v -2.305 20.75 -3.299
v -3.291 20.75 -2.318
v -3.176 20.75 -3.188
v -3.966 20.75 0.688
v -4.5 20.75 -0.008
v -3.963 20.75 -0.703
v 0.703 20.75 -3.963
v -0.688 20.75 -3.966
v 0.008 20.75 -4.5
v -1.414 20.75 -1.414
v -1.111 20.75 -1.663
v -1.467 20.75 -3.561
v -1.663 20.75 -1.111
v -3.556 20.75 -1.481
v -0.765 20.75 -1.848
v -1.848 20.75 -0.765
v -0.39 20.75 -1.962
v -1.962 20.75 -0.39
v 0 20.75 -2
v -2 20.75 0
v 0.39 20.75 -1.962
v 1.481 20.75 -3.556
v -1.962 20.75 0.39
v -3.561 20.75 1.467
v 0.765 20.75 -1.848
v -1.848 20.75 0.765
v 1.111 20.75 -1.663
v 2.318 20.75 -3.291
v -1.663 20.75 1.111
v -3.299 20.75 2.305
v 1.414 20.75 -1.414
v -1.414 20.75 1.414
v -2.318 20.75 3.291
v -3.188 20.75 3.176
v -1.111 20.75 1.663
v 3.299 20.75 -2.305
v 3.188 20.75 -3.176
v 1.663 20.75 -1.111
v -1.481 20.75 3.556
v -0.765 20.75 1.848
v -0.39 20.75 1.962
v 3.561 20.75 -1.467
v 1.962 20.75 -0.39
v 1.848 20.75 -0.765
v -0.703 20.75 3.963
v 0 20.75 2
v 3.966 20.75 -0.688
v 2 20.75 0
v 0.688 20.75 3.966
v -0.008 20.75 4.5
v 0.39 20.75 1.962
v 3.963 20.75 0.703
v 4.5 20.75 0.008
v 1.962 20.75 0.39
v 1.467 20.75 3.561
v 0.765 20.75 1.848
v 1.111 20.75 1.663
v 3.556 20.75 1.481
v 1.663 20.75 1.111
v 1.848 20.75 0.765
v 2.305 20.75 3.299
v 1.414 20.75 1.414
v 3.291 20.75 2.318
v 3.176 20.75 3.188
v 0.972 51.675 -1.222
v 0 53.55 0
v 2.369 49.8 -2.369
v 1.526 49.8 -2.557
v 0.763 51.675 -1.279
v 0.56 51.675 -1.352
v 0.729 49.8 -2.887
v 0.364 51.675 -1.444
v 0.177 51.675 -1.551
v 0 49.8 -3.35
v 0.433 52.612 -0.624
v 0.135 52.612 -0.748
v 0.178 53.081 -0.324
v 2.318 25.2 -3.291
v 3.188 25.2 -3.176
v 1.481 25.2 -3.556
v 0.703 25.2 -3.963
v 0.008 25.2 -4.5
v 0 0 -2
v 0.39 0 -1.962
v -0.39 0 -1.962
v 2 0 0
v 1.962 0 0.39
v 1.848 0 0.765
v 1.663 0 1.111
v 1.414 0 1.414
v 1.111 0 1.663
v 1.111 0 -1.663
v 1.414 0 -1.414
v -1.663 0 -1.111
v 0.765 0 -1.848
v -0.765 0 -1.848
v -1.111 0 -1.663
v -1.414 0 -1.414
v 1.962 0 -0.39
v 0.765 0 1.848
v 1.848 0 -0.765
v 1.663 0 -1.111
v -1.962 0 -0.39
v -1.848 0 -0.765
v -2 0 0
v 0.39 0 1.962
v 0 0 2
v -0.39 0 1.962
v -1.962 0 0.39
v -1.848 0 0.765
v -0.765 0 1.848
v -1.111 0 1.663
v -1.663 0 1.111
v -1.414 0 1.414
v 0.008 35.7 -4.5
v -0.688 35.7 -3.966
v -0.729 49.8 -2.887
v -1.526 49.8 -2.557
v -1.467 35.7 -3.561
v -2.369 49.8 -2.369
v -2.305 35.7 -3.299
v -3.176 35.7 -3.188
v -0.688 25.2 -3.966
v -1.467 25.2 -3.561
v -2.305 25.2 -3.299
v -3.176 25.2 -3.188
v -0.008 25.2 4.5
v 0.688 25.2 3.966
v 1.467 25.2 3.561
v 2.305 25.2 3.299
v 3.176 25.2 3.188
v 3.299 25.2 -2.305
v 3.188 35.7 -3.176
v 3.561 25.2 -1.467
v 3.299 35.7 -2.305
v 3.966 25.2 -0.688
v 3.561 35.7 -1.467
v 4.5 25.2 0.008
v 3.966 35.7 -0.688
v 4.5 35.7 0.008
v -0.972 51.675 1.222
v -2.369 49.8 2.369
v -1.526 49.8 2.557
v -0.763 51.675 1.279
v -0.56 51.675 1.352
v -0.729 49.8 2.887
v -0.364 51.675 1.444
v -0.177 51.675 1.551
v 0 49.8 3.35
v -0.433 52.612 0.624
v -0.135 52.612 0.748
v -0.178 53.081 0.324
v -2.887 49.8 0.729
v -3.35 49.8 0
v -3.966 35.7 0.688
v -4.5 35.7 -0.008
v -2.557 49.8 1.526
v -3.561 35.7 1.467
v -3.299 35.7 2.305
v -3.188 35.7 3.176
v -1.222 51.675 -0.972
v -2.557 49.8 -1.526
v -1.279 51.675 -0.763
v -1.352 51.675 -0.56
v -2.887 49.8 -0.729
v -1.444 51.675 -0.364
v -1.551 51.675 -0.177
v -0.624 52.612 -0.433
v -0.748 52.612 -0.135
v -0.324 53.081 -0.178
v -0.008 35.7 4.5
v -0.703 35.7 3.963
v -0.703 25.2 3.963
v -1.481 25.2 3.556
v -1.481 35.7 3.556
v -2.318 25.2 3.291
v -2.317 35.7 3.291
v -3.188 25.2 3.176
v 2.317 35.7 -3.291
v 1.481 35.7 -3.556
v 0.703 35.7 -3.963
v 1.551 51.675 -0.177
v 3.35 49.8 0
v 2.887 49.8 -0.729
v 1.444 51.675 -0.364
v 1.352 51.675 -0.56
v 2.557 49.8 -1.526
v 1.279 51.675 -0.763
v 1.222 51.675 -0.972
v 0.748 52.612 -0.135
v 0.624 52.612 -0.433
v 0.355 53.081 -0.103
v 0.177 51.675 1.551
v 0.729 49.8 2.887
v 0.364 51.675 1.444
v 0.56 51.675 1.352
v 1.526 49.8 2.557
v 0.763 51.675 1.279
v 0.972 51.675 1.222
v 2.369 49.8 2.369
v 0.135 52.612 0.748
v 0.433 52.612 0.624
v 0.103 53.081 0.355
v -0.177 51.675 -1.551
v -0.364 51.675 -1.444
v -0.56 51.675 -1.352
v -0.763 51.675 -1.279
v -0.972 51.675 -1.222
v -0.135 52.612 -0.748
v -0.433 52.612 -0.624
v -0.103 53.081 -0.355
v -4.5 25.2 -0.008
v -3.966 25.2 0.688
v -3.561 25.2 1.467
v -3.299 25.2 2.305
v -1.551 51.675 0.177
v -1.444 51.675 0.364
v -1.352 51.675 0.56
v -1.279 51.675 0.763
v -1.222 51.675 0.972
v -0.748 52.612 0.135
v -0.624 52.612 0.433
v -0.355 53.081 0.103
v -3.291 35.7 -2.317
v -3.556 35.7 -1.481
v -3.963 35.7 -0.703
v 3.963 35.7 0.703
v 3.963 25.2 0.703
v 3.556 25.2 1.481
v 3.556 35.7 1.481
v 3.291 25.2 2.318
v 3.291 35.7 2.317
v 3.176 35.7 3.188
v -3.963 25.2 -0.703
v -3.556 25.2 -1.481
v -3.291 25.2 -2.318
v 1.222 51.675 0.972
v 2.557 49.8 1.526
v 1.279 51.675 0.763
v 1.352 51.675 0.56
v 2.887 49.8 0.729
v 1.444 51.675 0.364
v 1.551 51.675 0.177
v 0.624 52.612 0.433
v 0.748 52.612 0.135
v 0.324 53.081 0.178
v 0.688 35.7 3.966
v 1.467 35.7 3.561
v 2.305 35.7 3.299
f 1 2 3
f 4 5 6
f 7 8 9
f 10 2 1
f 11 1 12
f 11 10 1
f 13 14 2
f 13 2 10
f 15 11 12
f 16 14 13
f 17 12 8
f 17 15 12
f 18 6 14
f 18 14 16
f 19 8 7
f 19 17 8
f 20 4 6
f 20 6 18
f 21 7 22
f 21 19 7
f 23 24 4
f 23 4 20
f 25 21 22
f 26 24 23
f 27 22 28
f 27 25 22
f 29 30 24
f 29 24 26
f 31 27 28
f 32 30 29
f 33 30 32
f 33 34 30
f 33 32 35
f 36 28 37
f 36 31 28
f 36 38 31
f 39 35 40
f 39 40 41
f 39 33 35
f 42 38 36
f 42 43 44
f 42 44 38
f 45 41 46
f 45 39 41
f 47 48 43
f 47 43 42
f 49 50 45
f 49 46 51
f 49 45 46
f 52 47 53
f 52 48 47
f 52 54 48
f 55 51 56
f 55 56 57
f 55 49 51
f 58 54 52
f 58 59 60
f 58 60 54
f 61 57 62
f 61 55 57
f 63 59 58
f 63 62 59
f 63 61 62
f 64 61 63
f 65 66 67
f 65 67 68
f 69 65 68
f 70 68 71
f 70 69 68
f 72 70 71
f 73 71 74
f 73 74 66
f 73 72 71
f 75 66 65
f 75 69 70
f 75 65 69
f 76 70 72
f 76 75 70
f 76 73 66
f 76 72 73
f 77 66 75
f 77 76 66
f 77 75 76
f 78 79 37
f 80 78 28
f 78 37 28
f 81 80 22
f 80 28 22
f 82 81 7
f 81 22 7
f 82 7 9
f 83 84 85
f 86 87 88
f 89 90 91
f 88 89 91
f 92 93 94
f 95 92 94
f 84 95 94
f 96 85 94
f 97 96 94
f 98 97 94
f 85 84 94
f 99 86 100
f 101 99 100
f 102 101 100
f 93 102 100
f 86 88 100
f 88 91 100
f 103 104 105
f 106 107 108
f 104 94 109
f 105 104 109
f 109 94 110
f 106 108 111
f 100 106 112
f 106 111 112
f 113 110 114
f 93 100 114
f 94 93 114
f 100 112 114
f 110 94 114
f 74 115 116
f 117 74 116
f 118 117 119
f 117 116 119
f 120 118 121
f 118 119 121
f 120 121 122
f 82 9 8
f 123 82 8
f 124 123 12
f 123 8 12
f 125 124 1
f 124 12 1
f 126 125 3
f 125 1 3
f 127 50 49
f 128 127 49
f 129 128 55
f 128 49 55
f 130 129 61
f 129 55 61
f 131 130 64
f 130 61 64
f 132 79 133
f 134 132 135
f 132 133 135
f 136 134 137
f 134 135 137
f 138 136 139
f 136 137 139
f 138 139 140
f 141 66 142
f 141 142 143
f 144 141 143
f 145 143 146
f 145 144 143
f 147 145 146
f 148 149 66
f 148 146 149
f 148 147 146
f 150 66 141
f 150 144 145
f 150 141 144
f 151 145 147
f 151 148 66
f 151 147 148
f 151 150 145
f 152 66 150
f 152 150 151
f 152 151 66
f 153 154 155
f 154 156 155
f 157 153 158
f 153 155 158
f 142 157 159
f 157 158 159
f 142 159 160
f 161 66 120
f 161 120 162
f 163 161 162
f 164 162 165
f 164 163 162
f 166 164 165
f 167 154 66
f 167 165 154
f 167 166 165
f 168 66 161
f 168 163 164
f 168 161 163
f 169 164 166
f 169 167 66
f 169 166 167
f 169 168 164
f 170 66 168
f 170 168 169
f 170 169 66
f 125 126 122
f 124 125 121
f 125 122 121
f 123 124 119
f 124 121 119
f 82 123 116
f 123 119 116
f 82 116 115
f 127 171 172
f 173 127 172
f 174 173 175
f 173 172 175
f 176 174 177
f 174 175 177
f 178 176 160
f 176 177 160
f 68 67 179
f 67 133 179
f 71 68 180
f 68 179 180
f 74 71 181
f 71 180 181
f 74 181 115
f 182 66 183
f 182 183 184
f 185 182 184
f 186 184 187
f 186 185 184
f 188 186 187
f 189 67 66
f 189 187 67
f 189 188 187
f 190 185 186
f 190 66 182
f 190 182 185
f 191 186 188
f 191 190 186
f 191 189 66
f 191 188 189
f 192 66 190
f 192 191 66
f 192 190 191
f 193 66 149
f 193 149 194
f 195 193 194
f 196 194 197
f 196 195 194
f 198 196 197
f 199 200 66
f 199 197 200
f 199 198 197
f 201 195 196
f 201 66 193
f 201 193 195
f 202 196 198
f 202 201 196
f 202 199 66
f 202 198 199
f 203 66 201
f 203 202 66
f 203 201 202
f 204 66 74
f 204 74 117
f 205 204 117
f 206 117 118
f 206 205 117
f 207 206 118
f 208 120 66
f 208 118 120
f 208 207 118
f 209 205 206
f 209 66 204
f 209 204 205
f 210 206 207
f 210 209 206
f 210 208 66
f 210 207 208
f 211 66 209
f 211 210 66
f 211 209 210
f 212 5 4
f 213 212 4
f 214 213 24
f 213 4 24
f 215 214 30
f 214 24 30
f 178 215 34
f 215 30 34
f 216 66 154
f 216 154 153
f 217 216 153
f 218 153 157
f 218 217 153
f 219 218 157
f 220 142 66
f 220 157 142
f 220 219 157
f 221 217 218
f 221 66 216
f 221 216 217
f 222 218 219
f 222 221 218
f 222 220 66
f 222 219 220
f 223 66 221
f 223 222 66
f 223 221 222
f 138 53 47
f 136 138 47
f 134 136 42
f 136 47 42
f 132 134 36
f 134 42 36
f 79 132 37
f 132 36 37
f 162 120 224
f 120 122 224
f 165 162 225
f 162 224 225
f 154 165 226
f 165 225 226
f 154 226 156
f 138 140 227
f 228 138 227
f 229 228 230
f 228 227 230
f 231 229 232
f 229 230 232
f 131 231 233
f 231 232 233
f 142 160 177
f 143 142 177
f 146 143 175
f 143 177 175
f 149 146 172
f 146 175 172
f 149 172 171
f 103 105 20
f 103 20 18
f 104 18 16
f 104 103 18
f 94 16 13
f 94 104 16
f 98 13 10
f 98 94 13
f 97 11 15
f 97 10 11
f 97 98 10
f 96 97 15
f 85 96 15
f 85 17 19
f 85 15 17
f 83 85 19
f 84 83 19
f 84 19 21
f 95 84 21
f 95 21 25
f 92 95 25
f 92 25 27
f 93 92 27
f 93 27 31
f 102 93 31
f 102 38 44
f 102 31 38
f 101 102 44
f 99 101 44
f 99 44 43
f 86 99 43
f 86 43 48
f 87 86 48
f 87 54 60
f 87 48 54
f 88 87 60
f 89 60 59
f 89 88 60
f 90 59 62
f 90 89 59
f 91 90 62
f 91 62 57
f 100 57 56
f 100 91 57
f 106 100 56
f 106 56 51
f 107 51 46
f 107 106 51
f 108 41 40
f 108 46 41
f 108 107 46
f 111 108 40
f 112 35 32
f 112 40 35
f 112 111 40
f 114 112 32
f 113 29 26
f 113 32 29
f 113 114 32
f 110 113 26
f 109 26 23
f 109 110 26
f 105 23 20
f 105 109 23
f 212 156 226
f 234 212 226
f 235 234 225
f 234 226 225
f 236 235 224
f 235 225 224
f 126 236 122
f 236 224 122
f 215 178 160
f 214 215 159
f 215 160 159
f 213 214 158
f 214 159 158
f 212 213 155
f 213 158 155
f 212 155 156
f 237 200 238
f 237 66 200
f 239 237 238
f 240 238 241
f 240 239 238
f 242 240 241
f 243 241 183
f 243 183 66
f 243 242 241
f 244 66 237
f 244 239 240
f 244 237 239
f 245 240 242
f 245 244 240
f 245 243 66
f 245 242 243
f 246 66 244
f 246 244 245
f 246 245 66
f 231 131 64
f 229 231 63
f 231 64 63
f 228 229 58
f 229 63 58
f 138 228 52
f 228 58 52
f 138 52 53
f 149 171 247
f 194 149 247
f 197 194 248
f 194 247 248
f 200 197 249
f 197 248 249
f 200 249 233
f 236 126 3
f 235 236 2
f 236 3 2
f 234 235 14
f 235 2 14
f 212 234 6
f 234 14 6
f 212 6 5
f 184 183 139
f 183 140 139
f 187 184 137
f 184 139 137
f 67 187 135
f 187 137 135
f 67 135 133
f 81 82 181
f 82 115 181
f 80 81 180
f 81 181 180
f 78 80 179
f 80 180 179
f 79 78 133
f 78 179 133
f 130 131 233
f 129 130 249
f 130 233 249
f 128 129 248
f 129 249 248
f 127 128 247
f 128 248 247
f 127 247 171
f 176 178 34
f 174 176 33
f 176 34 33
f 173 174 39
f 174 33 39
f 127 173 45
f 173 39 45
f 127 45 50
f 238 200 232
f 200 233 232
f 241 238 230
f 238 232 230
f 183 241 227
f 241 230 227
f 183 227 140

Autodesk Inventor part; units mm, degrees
sketch "Sketch1" plane through (0, 0, 0) normal (1, 0, 0) x (0, 1, 0)
  point P0 (0, 0)
sketch "Sketch2" plane through (0, 0, 0) normal (0, 1, 0) x (-1, 0, 0)
  circle A0 centre (0, 0) radius 2
  dimension "d0" = 4
extrude "Extrusion1" add sketch "Sketch2" along normal blind 25.2
sketch "Sketch3" plane through (0, 25.2, 0) normal (0, 1, 0) x (1, 0, 0)
  circle A0 centre (0, 0) radius 2 projected
  circle A1 centre (0, 0) radius 4.5
  dimension "d3" = 9
extrude "Extrusion2" add sketch "Sketch3" along normal blind 2 contours A0 | A1
sketch "Sketch4" plane through (0, 27.2, 0) normal (0, 1, 0) x (1, 0, 0)
  circle A0 centre (0, 0) radius 4.5 projected
extrude "Extrusion3" add sketch "Sketch4" along normal blind 8.5
sketch "Sketch5" plane through (0, 35.7, 0) normal (0, 1, 0) x (1, 0, 0)
  point P0 (0, 0)
ref_plane "Work Plane1" through (0, 49.8, 0) normal (0, 1, 0) x (1, 0, 0)
sketch "Sketch6" plane through (0, 49.8, 0) normal (0, 1, 0) x (1, 0, 0)
  arc A0 (2.3688, -2.3688) -> (0, -3.35) centre (3.0339, -7.3244) ccw
  arc A1 (0, -3.35) -> (-2.3688, -2.3688) centre (-3.0339, -7.3244) ccw
  arc A2 (3.35, 0) -> (2.3688, -2.3688) centre (7.3244, -3.0339) ccw
  arc A3 (2.3688, 2.3688) -> (3.35, 0) centre (7.3244, 3.0339) ccw
  arc A4 (-3.35, 0) -> (-2.3688, 2.3688) centre (-7.3244, 3.0339) ccw
  arc A5 (-2.3688, -2.3688) -> (-3.35, 0) centre (-7.3244, -3.0339) ccw
  arc A6 (-2.3688, 2.3688) -> (0, 3.35) centre (-3.0339, 7.3244) ccw
  arc A7 (0, 3.35) -> (2.3688, 2.3688) centre (3.0339, 7.3244) ccw
  point P0 (0, 0)
  dimension "d25" = 5
sketch "Sketch7" plane through (0, 35.7, 0) normal (0, 1, 0) x (1, 0, 0)
  circle A0 centre (0, 0) radius 4.5 projected
  circle A1 centre (0, 0) radius 4.5 projected
  arc A2 (-3.1879, -3.176) -> (-4.5, 0.0084) centre (-8.1841, -3.372) ccw
  arc A3 (-4.5, 0.0084) -> (-3.176, 3.1879) centre (-8.1714, 3.4027) ccw
  arc A4 (4.5, -0.0084) -> (3.176, -3.1879) centre (8.1714, -3.4027) ccw
  arc A5 (3.1879, 3.176) -> (4.5, -0.0084) centre (8.1841, 3.372) ccw
  arc A6 (-0.0084, -4.5) -> (-3.1879, -3.176) centre (-3.4027, -8.1714) ccw
  arc A7 (3.176, -3.1879) -> (-0.0084, -4.5) centre (3.372, -8.1841) ccw
  arc A8 (0.0084, 4.5) -> (3.1879, 3.176) centre (3.4027, 8.1714) ccw
  arc A9 (-3.176, 3.1879) -> (0.0084, 4.5) centre (-3.372, 8.1841) ccw
  circle A10 centre (0, 0) radius 4.5
extrude "Extrusion4" cut sketch "Sketch7" against normal blind 8.5 contours A0 A5 | A8 A0 | A0 A4 | A9 A0 | A0 A7 | A3 A0 | A0 A6 | A2 A0
ref_plane "Work Plane2" through (0, 49.8, 0) normal (0, 1, 0) x (1, 0, 0)
loft "Loft2" add profiles "Sketch6" section 2 edges at (-1.4806, 35.7, 3.5556) (1.4672, 35.7, 3.5611) (3.5556, 35.7, 1.4806) (3.5611, 35.7, -1.4672) (1.4806, 35.7, -3.5556) (-1.4672, 35.7, -3.5611) (-3.5556, 35.7, -1.4806) (-3.5611, 35.7, 1.4672)
sketch "Sketch10" plane through (0, 27.2, 0) normal (0, 1, 0) x (1, 0, 0)
  arc A0 (3.176, -3.1879) -> (-0.0084, -4.5) centre (3.372, -8.1841) ccw projected
  arc A1 (-0.0084, -4.5) -> (3.176, -3.1879) centre (0, 0) ccw projected
  arc A2 (-0.0084, -4.5) -> (-3.1879, -3.176) centre (-3.4027, -8.1714) ccw projected
  arc A3 (-0.0084, -4.5) -> (-3.1879, -3.176) centre (-3.4027, -8.1714) ccw projected
  arc A4 (-3.1879, -3.176) -> (-0.0084, -4.5) centre (0, 0) ccw projected
  arc A5 (-3.1879, -3.176) -> (-4.5, 0.0084) centre (-8.1841, -3.372) ccw projected
  arc A6 (-4.5, 0.0084) -> (-3.1879, -3.176) centre (0, 0) ccw projected
  arc A7 (-4.5, 0.0084) -> (-3.176, 3.1879) centre (-8.1714, 3.4027) ccw projected
  arc A8 (-3.176, 3.1879) -> (-4.5, 0.0084) centre (0, 0) ccw projected
  arc A9 (-3.176, 3.1879) -> (0.0084, 4.5) centre (-3.372, 8.1841) ccw projected
  arc A10 (-3.176, 3.1879) -> (0.0084, 4.5) centre (-3.372, 8.1841) ccw projected
  arc A11 (0.0084, 4.5) -> (-3.176, 3.1879) centre (0, 0) ccw projected
  arc A12 (0.0084, 4.5) -> (3.1879, 3.176) centre (3.4027, 8.1714) ccw projected
  arc A13 (3.1879, 3.176) -> (0.0084, 4.5) centre (0, 0) ccw projected
  arc A14 (3.1879, 3.176) -> (4.5, -0.0084) centre (8.1841, 3.372) ccw projected
  arc A15 (4.5, -0.0084) -> (3.1879, 3.176) centre (0, 0) ccw projected
  arc A16 (4.5, -0.0084) -> (3.176, -3.1879) centre (8.1714, -3.4027) ccw projected
  arc A17 (3.176, -3.1879) -> (4.5, -0.0084) centre (0, 0) ccw projected
extrude "Extrusion5" cut sketch "Sketch10" against normal blind 10 contours A1 A0 | A16 A17 | A4 A2 | A14 A15 | A6 A5 | A12 A13 | A8 A7 | A9 A11
sketch "Sketch11" plane through (0, 25.2, 0) normal (0, -1, 0) x (1, 0, 0)
  point P0 (0, 0)
ref_plane "Work Plane3" through (0, 20.75, 0) normal (0, -1, 0) x (1, 0, 0)
sketch "Sketch12" plane through (0, 20.75, 0) normal (0, -1, 0) x (1, 0, 0)
  circle A0 centre (0, 0) radius 2 projected
  circle A1 centre (0, 0) radius 3.5
  dimension "d33" = 7
extrude "Extrusion6" add sketch "Sketch12" against normal blind 1
fillet "Fillet1" radius 0.5 1 edges at (-3.5, 21.75, 0)
sketch "Sketch13" plane through (0, 20.75, 0) normal (0, -1, 0) x (1, 0, 0)
  arc A0 (3.176, 3.1879) -> (4.5, 0.0084) centre (8.1714, 3.4027) ccw projected
  arc A1 (-0.0084, 4.5) -> (3.176, 3.1879) centre (3.372, 8.1841) ccw projected
  arc A2 (-3.1879, 3.176) -> (-0.0084, 4.5) centre (-3.4027, 8.1714) ccw projected
  arc A3 (-4.5, -0.0084) -> (-3.1879, 3.176) centre (-8.1841, 3.372) ccw projected
  arc A4 (-3.176, -3.1879) -> (-4.5, -0.0084) centre (-8.1714, -3.4027) ccw projected
  arc A5 (0.0084, -4.5) -> (-3.176, -3.1879) centre (-3.372, -8.1841) ccw projected
  arc A6 (3.1879, -3.176) -> (0.0084, -4.5) centre (3.4027, -8.1714) ccw projected
  arc A7 (4.5, 0.0084) -> (3.1879, -3.176) centre (8.1841, -3.372) ccw projected
  circle A8 centre (0, 0) radius 2 projected
extrude "Extrusion7" add sketch "Sketch13" against normal blind 10
ref_plane "Work Plane4" through (3.0339, 53.55, 7.3244) normal (0, 1, 0) x (0.9238795, 0, -0.3826834)
sketch "Sketch16" plane through (3.0339, 53.55, 7.3244) normal (0, 1, 0) x (0.9238795, 0, -0.3826834)
  arc A0 (1.282, 4.8329) -> (-1.282, 4.8329) centre (0, 0) ccw projected
  arc A1 (3.095, 6.6459) -> (1.282, 4.8329) centre (5.6058, 2.322) ccw projected
  arc A2 (3.095, 9.2098) -> (3.095, 6.6459) centre (7.9279, 7.9279) ccw projected
  arc A3 (1.282, 11.0228) -> (3.095, 9.2098) centre (5.6058, 13.5337) ccw projected
  arc A4 (-1.282, 11.0228) -> (1.282, 11.0228) centre (0, 15.8557) ccw projected
  arc A5 (-3.095, 9.2098) -> (-1.282, 11.0228) centre (-5.6058, 13.5337) ccw projected
  arc A6 (-3.095, 6.6459) -> (-3.095, 9.2098) centre (-7.9279, 7.9279) ccw projected
  arc A7 (-1.282, 4.8329) -> (-3.095, 6.6459) centre (-5.6058, 2.322) ccw projected
  point P0 (0, 7.9279)
  point P1 (0, 7.9279)
loft "Loft4" add section 1 edges at (1.1204, 49.8, 2.705) (2.705, 49.8, 1.1204) (2.705, 49.8, -1.1204) (1.1204, 49.8, -2.705) (-1.1204, 49.8, -2.705) (-2.705, 49.8, -1.1204) (-2.705, 49.8, 1.1204) (-1.1204, 49.8, 2.705) section 2 point at (0, 53.55, 0)
properties part number "mixer" material "PBT Plastic"
